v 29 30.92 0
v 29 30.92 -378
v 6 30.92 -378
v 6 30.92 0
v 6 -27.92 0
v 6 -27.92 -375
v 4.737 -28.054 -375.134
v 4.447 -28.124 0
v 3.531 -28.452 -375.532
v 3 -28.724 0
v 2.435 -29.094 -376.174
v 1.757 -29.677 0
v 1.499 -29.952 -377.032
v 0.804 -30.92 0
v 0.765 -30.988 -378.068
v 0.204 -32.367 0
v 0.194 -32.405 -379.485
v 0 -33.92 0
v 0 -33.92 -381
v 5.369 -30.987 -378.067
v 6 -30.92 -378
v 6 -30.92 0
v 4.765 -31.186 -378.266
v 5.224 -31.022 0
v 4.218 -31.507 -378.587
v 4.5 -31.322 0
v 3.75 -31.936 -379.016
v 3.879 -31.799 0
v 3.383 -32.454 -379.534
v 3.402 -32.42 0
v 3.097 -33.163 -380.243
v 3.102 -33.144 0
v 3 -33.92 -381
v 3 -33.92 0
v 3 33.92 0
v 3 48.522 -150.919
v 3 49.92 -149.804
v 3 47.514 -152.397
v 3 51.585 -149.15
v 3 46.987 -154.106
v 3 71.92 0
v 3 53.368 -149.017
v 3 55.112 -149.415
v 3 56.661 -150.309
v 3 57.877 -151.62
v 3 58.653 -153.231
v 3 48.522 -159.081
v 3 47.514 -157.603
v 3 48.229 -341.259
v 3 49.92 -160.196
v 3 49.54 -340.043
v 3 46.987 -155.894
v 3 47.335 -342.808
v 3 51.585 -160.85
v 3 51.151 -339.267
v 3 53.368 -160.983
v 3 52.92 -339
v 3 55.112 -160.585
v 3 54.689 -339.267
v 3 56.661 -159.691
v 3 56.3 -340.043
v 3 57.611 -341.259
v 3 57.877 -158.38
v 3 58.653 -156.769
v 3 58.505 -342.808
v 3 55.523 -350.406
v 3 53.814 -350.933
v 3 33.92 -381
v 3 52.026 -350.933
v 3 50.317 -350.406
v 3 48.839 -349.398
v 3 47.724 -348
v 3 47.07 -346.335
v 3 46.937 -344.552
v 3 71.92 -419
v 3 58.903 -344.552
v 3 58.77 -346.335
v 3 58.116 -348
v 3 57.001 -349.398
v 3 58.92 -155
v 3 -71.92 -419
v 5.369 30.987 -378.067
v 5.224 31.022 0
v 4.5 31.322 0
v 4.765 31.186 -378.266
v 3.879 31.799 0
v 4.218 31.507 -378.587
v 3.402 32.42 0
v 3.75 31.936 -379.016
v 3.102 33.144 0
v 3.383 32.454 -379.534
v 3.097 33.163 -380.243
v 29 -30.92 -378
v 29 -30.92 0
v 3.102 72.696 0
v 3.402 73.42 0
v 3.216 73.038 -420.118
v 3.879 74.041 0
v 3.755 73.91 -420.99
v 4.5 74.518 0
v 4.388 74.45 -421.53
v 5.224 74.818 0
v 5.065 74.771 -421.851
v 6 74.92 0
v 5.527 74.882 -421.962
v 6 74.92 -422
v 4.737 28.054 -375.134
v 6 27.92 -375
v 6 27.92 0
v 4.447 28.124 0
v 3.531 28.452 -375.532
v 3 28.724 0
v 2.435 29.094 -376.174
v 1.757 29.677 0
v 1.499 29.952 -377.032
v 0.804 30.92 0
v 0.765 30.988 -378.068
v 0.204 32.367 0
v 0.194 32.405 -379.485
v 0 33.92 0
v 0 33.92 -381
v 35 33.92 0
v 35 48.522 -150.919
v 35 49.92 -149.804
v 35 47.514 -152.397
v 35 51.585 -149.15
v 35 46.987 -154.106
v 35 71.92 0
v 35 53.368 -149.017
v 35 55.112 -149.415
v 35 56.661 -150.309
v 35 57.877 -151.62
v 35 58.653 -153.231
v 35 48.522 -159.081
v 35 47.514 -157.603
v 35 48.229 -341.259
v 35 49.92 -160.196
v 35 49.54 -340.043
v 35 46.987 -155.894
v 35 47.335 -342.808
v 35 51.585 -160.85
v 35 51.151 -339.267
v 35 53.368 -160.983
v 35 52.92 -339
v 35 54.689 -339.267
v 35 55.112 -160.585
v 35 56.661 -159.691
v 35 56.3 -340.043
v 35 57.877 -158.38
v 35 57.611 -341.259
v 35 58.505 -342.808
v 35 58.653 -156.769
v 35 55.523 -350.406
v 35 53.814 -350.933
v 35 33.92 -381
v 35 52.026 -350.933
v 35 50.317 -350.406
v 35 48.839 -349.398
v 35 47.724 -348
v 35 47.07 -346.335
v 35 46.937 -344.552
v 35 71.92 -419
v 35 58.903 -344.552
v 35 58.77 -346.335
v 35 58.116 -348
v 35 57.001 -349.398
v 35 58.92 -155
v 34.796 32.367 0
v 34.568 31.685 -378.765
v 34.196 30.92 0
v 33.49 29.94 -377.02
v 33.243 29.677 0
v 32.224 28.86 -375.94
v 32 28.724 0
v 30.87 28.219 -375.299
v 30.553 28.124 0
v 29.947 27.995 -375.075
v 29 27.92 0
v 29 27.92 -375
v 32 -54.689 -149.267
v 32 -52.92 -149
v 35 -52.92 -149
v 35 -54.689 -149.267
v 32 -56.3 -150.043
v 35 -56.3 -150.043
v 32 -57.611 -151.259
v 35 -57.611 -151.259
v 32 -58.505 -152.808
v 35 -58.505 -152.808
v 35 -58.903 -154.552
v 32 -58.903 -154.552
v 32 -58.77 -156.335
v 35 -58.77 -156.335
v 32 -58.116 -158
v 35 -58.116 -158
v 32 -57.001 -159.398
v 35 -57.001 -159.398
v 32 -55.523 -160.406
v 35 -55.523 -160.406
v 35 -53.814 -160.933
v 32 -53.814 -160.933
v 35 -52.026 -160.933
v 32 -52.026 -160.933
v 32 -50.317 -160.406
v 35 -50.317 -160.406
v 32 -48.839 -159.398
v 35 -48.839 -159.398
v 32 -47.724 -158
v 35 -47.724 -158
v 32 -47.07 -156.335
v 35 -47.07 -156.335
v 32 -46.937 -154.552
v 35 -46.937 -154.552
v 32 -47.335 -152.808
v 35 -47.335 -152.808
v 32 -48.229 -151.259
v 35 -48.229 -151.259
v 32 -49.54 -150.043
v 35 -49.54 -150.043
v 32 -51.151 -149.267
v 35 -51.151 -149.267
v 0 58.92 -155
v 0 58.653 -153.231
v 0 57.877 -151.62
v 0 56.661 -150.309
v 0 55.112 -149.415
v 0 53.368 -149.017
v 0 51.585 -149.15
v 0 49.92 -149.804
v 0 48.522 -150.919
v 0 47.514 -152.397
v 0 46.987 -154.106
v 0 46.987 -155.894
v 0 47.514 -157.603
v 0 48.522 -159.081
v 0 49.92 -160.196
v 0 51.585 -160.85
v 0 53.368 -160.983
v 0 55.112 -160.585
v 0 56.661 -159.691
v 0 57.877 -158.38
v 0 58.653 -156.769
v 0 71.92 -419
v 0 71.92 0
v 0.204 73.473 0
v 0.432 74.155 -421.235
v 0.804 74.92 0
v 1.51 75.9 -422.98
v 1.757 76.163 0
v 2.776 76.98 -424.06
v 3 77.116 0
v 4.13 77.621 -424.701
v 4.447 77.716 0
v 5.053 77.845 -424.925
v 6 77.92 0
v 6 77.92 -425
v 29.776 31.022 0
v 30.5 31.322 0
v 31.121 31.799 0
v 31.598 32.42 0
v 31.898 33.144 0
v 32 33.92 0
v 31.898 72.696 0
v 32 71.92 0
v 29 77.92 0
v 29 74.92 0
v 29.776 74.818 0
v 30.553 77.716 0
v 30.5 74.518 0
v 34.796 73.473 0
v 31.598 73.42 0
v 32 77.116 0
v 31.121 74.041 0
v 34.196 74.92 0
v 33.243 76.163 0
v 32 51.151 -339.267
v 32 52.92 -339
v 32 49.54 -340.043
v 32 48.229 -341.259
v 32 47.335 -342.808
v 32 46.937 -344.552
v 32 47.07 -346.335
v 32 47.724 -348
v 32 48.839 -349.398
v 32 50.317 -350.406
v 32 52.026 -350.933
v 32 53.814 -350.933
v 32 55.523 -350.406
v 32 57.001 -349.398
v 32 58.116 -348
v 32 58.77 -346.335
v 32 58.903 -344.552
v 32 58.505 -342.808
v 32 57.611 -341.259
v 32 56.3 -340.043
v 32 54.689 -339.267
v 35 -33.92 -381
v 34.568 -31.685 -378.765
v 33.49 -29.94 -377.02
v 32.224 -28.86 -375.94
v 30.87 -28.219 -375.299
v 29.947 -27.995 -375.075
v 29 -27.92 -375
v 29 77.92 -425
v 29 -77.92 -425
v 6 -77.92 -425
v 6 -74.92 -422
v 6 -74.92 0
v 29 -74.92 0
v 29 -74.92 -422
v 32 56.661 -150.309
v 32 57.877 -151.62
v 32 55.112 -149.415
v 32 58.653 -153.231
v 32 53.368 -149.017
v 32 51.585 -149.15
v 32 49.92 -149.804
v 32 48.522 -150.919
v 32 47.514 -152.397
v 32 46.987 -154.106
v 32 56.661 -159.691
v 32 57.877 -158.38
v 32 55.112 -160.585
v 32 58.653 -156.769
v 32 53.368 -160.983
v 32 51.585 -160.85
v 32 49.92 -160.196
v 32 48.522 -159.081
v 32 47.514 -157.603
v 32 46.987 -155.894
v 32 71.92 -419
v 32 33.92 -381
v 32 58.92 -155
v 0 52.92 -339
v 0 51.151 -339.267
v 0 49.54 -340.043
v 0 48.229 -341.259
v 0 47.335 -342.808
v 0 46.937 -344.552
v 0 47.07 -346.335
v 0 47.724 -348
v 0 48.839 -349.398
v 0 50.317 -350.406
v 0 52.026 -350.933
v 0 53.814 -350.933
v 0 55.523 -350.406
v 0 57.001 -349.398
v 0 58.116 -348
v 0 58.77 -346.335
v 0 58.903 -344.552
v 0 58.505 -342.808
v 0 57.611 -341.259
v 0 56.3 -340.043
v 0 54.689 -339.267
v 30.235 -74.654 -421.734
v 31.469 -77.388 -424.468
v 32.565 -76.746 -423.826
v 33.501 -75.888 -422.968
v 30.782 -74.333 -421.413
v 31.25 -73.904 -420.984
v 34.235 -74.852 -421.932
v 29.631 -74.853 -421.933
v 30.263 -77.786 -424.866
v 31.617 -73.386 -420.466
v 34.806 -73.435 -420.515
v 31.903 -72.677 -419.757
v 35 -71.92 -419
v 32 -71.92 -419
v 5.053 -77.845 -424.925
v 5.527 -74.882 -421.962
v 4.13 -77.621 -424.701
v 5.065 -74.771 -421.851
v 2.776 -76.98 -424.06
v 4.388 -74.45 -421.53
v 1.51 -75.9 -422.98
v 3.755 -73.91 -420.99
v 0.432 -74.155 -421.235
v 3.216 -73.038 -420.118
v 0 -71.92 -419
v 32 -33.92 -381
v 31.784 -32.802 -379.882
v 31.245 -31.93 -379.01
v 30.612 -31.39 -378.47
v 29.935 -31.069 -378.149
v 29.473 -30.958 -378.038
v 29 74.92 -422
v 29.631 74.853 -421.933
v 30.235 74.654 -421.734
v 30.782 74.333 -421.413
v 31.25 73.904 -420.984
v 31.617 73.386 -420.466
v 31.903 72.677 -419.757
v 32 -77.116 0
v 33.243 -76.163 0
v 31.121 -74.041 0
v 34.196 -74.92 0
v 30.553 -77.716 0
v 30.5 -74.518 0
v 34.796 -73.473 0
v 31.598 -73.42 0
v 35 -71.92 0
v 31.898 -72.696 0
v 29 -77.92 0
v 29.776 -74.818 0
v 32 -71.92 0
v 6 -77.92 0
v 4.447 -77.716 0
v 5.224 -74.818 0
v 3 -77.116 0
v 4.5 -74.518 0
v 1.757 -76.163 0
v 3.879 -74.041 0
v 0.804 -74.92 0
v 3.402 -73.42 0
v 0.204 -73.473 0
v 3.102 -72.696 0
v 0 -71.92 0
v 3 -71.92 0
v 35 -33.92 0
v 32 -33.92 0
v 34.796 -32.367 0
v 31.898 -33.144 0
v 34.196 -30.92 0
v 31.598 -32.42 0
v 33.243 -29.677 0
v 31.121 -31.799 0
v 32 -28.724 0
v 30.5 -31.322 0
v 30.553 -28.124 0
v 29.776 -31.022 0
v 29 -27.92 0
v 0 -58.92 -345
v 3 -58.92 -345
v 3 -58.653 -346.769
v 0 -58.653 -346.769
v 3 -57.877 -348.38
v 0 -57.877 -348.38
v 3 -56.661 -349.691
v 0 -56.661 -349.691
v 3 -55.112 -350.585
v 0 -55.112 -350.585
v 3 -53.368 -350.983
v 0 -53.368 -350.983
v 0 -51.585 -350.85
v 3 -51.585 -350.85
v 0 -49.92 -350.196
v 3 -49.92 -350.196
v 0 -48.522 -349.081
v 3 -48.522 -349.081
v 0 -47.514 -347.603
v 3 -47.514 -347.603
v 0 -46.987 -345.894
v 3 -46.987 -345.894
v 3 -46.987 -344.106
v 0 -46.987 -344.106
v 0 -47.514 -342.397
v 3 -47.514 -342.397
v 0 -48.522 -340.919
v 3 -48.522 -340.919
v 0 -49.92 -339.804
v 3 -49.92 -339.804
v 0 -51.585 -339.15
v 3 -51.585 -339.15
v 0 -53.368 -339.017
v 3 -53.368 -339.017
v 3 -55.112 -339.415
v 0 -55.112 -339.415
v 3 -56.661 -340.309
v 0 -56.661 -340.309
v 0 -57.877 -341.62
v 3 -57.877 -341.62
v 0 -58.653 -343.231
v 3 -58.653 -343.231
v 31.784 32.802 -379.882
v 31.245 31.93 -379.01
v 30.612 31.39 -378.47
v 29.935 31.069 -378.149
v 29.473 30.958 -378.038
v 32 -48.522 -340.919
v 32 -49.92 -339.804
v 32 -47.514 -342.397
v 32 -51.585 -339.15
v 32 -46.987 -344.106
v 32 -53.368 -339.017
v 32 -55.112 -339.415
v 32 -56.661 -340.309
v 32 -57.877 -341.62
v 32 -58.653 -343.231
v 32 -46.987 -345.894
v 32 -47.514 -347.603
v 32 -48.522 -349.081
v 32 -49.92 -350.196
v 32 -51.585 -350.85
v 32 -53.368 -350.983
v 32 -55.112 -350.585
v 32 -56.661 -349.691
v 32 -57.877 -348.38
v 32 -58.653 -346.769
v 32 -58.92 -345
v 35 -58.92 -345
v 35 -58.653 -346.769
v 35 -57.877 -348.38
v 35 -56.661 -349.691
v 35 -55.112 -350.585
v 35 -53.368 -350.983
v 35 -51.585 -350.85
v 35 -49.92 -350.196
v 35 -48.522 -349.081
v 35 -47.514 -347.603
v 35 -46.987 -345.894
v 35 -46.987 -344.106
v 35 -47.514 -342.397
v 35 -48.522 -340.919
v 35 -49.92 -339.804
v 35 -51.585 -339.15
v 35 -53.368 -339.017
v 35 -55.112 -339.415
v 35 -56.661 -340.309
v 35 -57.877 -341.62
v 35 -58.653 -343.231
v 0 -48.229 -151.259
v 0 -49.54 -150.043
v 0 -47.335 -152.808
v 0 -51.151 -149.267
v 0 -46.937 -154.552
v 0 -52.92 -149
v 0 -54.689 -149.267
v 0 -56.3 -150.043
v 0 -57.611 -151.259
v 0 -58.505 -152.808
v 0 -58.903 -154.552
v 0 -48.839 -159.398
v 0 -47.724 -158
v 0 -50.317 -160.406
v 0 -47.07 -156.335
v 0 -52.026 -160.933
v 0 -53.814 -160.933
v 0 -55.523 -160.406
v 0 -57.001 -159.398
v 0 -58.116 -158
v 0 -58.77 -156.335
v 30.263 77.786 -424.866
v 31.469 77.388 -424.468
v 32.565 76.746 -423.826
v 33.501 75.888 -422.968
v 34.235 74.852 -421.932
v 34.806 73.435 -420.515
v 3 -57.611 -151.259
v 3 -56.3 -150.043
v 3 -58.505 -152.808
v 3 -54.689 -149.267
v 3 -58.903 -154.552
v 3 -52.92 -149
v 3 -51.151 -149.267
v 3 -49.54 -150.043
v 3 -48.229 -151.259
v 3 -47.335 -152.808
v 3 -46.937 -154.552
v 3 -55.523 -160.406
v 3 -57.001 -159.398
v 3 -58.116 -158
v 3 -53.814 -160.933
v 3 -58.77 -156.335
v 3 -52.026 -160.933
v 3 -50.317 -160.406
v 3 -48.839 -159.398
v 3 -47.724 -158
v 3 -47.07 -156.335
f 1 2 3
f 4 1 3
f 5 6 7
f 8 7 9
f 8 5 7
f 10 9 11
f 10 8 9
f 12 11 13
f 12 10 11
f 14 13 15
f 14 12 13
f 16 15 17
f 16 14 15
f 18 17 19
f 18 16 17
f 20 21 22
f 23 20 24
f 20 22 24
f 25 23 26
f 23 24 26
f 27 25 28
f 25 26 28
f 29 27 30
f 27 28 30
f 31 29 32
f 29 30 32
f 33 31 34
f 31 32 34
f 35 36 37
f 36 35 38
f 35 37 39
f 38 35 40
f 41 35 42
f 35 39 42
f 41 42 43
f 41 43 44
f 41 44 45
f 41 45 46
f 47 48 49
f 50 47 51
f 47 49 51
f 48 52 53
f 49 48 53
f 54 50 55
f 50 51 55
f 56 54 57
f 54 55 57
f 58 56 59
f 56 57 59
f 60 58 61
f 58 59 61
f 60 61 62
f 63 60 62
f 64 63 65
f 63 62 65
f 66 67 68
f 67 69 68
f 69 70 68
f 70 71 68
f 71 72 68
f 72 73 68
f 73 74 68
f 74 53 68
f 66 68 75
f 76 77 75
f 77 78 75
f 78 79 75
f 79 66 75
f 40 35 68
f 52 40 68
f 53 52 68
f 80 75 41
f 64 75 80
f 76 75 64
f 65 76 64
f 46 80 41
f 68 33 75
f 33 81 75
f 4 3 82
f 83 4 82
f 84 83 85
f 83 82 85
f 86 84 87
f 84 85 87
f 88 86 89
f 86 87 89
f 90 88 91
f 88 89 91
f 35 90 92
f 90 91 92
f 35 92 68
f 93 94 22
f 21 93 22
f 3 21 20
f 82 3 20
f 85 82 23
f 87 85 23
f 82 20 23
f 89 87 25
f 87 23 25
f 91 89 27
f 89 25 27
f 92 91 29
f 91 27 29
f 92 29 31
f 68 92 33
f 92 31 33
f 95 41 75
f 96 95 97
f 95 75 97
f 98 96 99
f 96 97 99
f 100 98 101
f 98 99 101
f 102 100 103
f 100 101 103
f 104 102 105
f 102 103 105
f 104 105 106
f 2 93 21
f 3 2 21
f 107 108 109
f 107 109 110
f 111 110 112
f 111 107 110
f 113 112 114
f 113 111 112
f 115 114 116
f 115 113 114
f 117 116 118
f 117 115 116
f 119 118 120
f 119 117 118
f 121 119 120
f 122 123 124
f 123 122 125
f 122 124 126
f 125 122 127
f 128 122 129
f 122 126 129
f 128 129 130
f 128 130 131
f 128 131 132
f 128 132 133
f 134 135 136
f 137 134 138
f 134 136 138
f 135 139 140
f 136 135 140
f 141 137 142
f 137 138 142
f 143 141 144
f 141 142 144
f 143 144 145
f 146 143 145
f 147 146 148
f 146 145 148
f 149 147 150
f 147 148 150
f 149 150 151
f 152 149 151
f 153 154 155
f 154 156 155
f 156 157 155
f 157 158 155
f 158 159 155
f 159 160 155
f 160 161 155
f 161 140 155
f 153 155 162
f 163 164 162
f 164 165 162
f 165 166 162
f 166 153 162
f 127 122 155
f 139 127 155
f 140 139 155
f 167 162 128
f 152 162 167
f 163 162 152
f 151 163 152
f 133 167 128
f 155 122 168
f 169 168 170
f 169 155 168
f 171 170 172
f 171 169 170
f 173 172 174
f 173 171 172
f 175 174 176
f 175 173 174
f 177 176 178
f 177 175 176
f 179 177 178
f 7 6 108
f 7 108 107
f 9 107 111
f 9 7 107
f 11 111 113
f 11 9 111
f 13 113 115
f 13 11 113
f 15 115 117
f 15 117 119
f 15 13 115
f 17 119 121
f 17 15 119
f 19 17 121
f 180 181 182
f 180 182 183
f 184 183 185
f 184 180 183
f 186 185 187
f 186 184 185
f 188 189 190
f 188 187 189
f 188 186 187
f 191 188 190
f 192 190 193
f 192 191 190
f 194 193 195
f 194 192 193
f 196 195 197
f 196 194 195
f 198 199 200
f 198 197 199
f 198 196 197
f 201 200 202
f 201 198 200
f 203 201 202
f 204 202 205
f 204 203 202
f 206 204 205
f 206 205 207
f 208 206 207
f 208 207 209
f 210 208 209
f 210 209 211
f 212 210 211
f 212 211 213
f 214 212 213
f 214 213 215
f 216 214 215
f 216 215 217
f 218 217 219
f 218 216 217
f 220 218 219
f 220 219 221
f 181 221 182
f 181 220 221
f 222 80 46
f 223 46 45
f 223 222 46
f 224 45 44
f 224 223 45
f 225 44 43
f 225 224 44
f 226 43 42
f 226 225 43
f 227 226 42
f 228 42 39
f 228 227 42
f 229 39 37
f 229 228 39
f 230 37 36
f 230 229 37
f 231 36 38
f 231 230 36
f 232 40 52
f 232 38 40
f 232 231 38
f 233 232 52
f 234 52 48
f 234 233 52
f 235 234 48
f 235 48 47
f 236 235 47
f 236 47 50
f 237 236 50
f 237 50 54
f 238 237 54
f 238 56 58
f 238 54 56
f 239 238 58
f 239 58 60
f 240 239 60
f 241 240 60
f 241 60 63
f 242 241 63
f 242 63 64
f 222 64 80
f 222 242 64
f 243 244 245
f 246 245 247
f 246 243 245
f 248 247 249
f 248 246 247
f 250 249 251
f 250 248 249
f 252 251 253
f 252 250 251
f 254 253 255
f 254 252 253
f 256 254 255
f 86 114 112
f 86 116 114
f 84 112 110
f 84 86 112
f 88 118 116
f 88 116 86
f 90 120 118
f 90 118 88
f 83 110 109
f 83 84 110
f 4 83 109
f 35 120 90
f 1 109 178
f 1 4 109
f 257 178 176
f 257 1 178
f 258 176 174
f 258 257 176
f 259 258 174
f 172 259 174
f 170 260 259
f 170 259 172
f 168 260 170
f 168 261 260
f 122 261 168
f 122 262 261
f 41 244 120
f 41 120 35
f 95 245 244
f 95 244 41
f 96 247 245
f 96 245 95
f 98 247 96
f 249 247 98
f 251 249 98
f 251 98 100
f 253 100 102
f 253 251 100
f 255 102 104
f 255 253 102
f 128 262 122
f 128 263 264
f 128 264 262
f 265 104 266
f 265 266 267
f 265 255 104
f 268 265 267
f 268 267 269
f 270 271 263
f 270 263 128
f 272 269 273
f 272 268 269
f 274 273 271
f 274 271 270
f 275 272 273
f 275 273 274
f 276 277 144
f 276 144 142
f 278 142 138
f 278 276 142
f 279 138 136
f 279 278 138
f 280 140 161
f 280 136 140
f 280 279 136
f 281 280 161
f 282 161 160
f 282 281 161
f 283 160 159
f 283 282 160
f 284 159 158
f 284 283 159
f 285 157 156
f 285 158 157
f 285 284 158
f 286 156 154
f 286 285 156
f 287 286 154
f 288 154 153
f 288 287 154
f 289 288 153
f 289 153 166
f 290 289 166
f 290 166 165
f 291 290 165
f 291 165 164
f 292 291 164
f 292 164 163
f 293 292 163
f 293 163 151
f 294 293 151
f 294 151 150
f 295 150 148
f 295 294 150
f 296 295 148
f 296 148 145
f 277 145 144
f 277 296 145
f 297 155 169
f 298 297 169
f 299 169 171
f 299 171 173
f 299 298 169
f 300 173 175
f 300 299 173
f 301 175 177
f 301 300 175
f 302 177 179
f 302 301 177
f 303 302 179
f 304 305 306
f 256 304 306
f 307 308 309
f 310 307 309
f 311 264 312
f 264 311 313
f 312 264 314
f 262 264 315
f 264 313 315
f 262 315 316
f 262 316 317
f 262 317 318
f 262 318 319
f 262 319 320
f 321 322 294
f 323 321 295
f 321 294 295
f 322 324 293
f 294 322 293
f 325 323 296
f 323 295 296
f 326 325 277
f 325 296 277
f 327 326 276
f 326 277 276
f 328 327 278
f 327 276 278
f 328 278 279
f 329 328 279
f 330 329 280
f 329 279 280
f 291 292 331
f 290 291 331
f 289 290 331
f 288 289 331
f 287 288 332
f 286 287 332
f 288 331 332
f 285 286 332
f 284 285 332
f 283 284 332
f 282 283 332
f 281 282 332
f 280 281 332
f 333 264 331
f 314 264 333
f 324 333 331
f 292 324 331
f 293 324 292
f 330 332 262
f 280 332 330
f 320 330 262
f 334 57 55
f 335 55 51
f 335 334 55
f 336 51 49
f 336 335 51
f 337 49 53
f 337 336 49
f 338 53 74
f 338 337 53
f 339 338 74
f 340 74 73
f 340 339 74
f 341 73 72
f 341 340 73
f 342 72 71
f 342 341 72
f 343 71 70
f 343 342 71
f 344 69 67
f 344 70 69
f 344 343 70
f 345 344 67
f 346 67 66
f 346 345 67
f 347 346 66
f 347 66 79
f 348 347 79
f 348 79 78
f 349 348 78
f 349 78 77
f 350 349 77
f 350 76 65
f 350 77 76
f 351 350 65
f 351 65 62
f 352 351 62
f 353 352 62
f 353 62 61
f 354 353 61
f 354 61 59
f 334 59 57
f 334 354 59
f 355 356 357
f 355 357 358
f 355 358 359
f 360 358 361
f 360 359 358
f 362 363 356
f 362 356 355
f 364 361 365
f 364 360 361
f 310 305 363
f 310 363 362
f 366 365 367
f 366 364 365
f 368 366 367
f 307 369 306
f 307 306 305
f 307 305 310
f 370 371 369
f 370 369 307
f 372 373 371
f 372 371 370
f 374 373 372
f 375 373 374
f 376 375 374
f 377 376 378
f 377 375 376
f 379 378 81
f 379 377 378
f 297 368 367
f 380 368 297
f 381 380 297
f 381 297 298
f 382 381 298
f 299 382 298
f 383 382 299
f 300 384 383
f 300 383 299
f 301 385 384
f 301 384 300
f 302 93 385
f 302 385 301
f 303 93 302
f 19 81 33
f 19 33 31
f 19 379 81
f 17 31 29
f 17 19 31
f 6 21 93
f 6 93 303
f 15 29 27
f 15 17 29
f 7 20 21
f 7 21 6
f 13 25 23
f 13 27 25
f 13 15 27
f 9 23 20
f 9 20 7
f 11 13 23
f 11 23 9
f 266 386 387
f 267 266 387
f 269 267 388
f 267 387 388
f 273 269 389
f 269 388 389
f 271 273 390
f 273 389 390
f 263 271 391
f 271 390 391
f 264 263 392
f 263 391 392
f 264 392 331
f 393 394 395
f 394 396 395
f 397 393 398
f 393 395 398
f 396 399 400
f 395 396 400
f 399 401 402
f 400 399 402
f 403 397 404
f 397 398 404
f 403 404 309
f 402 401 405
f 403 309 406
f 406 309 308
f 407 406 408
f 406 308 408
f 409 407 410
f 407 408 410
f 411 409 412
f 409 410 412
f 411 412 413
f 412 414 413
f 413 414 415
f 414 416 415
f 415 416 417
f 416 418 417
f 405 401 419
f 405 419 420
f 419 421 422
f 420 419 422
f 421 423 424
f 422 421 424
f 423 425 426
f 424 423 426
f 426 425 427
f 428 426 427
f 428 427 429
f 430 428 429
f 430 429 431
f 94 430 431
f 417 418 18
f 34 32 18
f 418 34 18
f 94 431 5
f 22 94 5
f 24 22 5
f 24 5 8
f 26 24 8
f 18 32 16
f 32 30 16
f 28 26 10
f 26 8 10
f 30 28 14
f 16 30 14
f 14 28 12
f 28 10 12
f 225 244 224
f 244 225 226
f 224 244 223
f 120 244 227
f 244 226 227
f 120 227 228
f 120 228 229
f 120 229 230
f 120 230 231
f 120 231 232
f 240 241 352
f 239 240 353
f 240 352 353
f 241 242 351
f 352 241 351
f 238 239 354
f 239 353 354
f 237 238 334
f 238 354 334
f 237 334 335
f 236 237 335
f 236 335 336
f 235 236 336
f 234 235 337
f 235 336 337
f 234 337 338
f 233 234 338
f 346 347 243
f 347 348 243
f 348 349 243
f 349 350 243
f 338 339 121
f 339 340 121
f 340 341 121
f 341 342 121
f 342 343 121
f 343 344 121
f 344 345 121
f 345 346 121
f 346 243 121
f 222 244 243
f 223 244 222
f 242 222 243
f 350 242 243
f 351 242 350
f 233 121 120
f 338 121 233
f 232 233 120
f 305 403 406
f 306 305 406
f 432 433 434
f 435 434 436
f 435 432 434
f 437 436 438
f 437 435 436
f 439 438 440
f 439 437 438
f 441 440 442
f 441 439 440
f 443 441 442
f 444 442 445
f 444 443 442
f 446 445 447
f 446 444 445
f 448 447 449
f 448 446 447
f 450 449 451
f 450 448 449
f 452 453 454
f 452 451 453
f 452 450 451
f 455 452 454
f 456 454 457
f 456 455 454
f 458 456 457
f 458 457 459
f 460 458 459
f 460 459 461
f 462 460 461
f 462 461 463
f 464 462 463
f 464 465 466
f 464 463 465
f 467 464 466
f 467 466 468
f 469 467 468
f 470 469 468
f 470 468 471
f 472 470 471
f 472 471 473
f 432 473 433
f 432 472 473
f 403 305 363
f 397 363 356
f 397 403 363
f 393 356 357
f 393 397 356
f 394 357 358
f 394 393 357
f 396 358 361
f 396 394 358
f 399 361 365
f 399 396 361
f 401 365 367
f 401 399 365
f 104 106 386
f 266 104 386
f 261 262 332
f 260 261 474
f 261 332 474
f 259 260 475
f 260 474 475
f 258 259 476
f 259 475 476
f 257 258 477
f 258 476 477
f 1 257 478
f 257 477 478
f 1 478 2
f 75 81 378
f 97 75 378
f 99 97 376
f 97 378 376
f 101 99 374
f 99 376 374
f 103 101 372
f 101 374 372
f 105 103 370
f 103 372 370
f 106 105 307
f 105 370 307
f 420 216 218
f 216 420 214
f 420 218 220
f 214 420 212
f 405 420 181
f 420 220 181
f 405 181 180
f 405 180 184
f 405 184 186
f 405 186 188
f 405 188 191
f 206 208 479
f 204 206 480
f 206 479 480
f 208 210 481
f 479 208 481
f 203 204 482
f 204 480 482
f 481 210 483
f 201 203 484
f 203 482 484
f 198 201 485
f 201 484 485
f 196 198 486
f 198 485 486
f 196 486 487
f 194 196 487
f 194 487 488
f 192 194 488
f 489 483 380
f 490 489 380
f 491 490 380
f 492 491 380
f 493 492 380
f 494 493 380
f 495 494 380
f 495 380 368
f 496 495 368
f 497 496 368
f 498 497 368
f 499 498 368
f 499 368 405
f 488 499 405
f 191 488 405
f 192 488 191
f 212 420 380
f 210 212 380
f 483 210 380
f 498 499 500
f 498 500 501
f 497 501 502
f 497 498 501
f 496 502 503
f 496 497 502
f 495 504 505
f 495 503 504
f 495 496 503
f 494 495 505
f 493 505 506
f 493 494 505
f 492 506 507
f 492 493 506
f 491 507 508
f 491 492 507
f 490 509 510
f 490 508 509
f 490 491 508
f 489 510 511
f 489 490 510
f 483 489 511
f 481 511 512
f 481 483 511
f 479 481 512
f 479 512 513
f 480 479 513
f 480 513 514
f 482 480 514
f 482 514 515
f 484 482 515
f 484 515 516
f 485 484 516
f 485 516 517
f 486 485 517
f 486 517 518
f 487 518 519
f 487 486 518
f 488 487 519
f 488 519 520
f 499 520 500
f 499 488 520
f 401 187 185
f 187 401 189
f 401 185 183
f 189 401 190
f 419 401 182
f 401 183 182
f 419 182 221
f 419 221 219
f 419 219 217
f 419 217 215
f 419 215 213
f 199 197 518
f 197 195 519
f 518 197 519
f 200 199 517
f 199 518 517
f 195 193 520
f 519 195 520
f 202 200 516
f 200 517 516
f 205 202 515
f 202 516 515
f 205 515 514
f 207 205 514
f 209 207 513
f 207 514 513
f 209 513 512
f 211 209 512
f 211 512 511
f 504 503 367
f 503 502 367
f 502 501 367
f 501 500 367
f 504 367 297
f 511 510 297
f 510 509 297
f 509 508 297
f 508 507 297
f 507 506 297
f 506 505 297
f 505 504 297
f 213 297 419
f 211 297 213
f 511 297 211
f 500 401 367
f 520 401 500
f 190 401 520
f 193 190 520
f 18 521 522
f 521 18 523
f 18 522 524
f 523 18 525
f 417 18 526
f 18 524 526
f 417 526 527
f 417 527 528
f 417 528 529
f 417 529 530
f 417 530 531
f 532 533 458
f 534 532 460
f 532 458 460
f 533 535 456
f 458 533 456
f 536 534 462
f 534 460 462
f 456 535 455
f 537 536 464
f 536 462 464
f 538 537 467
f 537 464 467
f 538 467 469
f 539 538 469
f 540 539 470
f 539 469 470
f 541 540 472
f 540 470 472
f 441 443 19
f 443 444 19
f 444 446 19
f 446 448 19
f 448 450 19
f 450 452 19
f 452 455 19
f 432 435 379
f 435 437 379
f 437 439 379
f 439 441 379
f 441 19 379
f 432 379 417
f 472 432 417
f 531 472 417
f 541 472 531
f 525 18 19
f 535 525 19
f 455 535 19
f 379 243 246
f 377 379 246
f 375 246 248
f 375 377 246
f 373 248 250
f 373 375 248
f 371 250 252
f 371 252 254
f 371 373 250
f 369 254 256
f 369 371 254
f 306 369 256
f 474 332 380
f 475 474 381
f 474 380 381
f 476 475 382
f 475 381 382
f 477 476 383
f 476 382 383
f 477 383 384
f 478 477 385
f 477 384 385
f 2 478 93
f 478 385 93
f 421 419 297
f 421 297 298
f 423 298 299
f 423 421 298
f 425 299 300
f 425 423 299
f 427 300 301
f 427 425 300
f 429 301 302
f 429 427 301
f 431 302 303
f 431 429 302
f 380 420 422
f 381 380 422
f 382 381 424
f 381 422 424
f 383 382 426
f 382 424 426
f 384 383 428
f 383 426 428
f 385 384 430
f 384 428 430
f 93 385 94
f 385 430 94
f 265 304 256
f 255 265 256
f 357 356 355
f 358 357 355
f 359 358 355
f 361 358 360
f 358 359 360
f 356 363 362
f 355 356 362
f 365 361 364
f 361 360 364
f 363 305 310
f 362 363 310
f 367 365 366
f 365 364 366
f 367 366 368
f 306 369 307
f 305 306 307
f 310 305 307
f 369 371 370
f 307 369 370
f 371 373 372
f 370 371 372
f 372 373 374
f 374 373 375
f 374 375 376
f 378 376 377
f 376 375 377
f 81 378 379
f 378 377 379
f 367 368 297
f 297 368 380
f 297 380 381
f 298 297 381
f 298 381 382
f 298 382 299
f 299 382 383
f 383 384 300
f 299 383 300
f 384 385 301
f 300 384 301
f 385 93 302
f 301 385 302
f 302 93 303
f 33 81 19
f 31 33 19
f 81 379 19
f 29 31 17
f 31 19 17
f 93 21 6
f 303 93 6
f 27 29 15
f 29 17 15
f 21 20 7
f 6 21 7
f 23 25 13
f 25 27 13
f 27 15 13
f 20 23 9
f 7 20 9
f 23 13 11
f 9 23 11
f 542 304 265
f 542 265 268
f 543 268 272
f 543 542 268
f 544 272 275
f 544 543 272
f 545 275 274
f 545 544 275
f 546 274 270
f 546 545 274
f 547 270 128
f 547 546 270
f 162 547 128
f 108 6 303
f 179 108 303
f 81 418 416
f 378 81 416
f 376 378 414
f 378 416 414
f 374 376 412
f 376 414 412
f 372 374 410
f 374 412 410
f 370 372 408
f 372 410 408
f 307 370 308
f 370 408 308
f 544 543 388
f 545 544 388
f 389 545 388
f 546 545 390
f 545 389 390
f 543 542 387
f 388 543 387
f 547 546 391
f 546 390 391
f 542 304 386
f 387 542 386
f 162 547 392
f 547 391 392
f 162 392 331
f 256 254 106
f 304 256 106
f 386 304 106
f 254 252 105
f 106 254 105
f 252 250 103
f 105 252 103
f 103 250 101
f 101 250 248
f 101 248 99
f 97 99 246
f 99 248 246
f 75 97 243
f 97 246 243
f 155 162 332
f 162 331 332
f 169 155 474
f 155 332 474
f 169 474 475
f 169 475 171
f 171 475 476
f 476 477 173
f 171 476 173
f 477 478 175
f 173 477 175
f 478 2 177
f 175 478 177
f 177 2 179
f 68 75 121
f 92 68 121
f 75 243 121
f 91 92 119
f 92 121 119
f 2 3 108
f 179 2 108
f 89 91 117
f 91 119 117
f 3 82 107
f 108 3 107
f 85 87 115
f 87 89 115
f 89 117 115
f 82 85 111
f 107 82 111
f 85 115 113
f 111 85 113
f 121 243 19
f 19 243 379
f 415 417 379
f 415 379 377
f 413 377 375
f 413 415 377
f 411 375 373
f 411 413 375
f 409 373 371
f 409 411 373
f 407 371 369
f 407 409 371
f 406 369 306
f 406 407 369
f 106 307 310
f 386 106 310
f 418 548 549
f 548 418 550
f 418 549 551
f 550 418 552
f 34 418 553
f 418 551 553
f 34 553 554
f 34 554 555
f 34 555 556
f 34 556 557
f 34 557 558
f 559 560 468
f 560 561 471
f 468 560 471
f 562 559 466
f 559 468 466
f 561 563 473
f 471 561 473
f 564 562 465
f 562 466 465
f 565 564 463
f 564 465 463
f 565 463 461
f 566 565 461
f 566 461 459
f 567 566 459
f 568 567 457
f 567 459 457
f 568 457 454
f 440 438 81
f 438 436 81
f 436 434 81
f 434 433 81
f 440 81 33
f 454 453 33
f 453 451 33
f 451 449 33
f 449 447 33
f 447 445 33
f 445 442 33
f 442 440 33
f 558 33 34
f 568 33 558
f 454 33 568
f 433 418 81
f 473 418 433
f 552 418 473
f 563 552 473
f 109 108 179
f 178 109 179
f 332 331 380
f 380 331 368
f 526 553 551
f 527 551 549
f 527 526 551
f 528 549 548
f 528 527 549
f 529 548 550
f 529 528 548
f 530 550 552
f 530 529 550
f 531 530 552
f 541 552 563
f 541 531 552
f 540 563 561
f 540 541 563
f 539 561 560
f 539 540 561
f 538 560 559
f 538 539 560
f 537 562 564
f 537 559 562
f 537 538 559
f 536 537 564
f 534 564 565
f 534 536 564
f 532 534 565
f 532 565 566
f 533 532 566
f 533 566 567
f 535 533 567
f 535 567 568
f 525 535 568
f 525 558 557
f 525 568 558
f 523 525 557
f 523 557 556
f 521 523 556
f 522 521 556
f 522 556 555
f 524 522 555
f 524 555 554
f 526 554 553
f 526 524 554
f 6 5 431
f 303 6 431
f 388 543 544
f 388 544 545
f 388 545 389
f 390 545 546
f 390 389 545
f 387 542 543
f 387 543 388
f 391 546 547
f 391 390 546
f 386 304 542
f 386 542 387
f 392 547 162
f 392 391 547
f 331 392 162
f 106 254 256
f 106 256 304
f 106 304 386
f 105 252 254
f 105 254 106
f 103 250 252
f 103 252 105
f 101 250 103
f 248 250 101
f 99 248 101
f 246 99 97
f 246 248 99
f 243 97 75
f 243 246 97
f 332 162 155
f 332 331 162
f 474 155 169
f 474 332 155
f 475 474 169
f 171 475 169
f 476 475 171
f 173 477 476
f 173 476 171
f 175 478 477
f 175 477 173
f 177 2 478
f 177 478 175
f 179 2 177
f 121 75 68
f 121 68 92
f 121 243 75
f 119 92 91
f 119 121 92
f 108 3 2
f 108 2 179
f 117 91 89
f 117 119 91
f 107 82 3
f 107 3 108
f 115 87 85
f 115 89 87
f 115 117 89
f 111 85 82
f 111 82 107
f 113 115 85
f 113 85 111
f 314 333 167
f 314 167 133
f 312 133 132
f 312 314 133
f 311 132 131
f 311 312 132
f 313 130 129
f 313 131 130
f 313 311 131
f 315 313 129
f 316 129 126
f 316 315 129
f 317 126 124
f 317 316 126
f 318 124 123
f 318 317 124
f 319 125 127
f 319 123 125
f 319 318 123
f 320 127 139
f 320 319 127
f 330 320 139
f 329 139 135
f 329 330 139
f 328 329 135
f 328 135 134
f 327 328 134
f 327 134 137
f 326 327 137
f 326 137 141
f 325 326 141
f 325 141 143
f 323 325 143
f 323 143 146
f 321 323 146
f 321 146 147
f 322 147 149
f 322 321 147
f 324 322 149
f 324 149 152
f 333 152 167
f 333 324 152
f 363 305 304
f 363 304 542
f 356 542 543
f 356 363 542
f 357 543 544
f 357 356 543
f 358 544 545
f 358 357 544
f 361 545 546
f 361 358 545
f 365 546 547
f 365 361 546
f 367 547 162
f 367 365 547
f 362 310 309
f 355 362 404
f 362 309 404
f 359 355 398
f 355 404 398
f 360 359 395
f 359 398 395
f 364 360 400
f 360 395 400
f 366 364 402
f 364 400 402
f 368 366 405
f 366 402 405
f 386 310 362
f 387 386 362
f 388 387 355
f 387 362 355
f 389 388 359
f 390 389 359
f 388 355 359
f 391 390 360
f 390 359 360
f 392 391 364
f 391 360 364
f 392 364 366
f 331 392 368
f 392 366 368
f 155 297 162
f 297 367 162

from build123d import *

# Parameters (mm, degrees)
SPLIT1_SURFACE_1_1_BACK  = 455.022
SPLIT1_SURFACE_1_1_DEPTH = 910.044
SPLIT1_SURFACE_1_2_BACK  = 455.022
SPLIT1_SURFACE_1_2_DEPTH = 910.044
SPLIT1_SURFACE_2_3_BACK  = 455.022
SPLIT1_SURFACE_2_3_DEPTH = 910.044
SPLIT1_SURFACE_2_4_BACK  = 455.022
SPLIT1_SURFACE_2_4_DEPTH = 910.044
SKETCH5_R                = 6
CUT_EXTRUDE1_DEPTH       = 434.499165397


with BuildPart() as part:
    # Sweep-Thin1: sweep along a path in Sketch2
    with BuildLine(Plane(origin=(0, 0, 0), x_dir=(0, 0, -1), z_dir=(1, 0, 0))) as sweep_thin1_path:
        Line((0, 52.92), (400, 52.92))
        Line((400, 52.92), (400, -52.92))
        Line((400, -52.92), (0, -52.92))
    # Sketch1 → Sweep-Thin1 (sweep)
    with BuildSketch(Plane.XY):
        with BuildLine():
            Line((6, 77.92), (29, 77.92))
            ThreePointArc((29, 77.92), (33.242640687, 76.162640687), (35, 71.92))
            Line((35, 71.92), (35, 33.92))
            ThreePointArc((35, 33.92), (33.242640687, 29.677359313), (29, 27.92))
            Line((29, 27.92), (6, 27.92))
            ThreePointArc((6, 27.92), (1.757359313, 29.677359313), (0, 33.92))
            Line((0, 33.92), (0, 71.92))
            ThreePointArc((0, 71.92), (1.757359313, 76.162640687), (6, 77.92))
        make_face()
        with BuildLine():
            Line((6, 74.92), (29, 74.92))
            ThreePointArc((29, 74.92), (31.121320344, 74.041320344), (32, 71.92))
            Line((32, 71.92), (32, 33.92))
            ThreePointArc((32, 33.92), (31.121320344, 31.798679656), (29, 30.92))
            Line((29, 30.92), (6, 30.92))
            ThreePointArc((6, 30.92), (3.878679656, 31.798679656), (3, 33.92))
            Line((3, 33.92), (3, 71.92))
            ThreePointArc((3, 71.92), (3.878679656, 74.041320344), (6, 74.92))
        make_face(mode=Mode.SUBTRACT)
    sweep(path=sweep_thin1_path.line, transition=Transition.RIGHT)


with BuildPart() as body_2:
    # Split1: the piece behind the surface
    add(part.part)
    # Split1 surface 1: a surface, the sketch's curves swept straight by 910.044 mm
    with BuildLine(Plane(origin=(0, 0, 0), x_dir=(0, 0, -1), z_dir=(1, 0, 0)).offset(-SPLIT1_SURFACE_1_1_BACK), mode=Mode.PRIVATE) as split1_surface_1_1_path:
        Line((425, 77.92), (375, 27.92))
    split1_surface_1_1 = Shell.extrude(split1_surface_1_1_path.wire(), (1 * SPLIT1_SURFACE_1_1_DEPTH, 0 * SPLIT1_SURFACE_1_1_DEPTH, 0 * SPLIT1_SURFACE_1_1_DEPTH))
    split(bisect_by=split1_surface_1_1, keep=Keep.BOTTOM)


with BuildPart() as part_1:
    add(part.part)

    # Split1: split by a surface, the side it looks to stays
    # Split1 surface 1: a surface, the sketch's curves swept straight by 910.044 mm
    with BuildLine(Plane(origin=(0, 0, 0), x_dir=(0, 0, -1), z_dir=(1, 0, 0)).offset(-SPLIT1_SURFACE_1_2_BACK), mode=Mode.PRIVATE) as split1_surface_1_2_path:
        Line((425, 77.92), (375, 27.92))
    split1_surface_1_2 = Shell.extrude(split1_surface_1_2_path.wire(), (1 * SPLIT1_SURFACE_1_2_DEPTH, 0 * SPLIT1_SURFACE_1_2_DEPTH, 0 * SPLIT1_SURFACE_1_2_DEPTH))
    split(bisect_by=split1_surface_1_2, keep=Keep.TOP)


with BuildPart() as body_3:
    # Split1 2: the piece behind the surface
    add(part_1.part)
    # Split1 surface 2: a surface, the sketch's curves swept straight by 910.044 mm
    with BuildLine(Plane(origin=(0, 0, 0), x_dir=(0, 0, -1), z_dir=(1, 0, 0)).offset(-SPLIT1_SURFACE_2_3_BACK), mode=Mode.PRIVATE) as split1_surface_2_3_path:
        Line((425, -77.92), (375, -27.92))
    split1_surface_2_3 = Shell.extrude(split1_surface_2_3_path.wire(), (1 * SPLIT1_SURFACE_2_3_DEPTH, 0 * SPLIT1_SURFACE_2_3_DEPTH, 0 * SPLIT1_SURFACE_2_3_DEPTH))
    split(bisect_by=split1_surface_2_3, keep=Keep.BOTTOM)


with BuildPart() as part_2:
    add(part_1.part)

    # Split1 2: split by a surface, the side it looks to stays
    # Split1 surface 2: a surface, the sketch's curves swept straight by 910.044 mm
    with BuildLine(Plane(origin=(0, 0, 0), x_dir=(0, 0, -1), z_dir=(1, 0, 0)).offset(-SPLIT1_SURFACE_2_4_BACK), mode=Mode.PRIVATE) as split1_surface_2_4_path:
        Line((425, -77.92), (375, -27.92))
    split1_surface_2_4 = Shell.extrude(split1_surface_2_4_path.wire(), (1 * SPLIT1_SURFACE_2_4_DEPTH, 0 * SPLIT1_SURFACE_2_4_DEPTH, 0 * SPLIT1_SURFACE_2_4_DEPTH))
    split(bisect_by=split1_surface_2_4, keep=Keep.TOP)


with BuildPart() as cut_extrude1_tool:
    # Sketch5 → Cut-Extrude1 (new, through all)
    with BuildSketch(Plane(origin=(0, 0, 0), x_dir=(0, 0, -1), z_dir=(1, 0, 0))):
        with Locations(Location((155, 52.92, 0), (0, 0, 90))):
            Circle(SKETCH5_R)
        with Locations(Location((155, -52.92, 0), (0, 0, 180))):
            Circle(SKETCH5_R)
        with Locations(Location((345, -52.92, 0), (0, 0, 270))):
            Circle(SKETCH5_R)
        with Locations(Location((345, 52.92, 0), (0, 0, 180))):
            Circle(SKETCH5_R)
    extrude(amount=CUT_EXTRUDE1_DEPTH)


with BuildPart() as part_3:
    add(part_2.part)

    # Cut-Extrude1: cut by cut_extrude1_tool
    add(cut_extrude1_tool.part, mode=Mode.SUBTRACT)


with BuildPart() as body_2_1:
    add(body_2.part)

    # Cut-Extrude1: cut by cut_extrude1_tool
    add(cut_extrude1_tool.part, mode=Mode.SUBTRACT)


solid = Compound([body_3.part, part_3.part, body_2_1.part])
